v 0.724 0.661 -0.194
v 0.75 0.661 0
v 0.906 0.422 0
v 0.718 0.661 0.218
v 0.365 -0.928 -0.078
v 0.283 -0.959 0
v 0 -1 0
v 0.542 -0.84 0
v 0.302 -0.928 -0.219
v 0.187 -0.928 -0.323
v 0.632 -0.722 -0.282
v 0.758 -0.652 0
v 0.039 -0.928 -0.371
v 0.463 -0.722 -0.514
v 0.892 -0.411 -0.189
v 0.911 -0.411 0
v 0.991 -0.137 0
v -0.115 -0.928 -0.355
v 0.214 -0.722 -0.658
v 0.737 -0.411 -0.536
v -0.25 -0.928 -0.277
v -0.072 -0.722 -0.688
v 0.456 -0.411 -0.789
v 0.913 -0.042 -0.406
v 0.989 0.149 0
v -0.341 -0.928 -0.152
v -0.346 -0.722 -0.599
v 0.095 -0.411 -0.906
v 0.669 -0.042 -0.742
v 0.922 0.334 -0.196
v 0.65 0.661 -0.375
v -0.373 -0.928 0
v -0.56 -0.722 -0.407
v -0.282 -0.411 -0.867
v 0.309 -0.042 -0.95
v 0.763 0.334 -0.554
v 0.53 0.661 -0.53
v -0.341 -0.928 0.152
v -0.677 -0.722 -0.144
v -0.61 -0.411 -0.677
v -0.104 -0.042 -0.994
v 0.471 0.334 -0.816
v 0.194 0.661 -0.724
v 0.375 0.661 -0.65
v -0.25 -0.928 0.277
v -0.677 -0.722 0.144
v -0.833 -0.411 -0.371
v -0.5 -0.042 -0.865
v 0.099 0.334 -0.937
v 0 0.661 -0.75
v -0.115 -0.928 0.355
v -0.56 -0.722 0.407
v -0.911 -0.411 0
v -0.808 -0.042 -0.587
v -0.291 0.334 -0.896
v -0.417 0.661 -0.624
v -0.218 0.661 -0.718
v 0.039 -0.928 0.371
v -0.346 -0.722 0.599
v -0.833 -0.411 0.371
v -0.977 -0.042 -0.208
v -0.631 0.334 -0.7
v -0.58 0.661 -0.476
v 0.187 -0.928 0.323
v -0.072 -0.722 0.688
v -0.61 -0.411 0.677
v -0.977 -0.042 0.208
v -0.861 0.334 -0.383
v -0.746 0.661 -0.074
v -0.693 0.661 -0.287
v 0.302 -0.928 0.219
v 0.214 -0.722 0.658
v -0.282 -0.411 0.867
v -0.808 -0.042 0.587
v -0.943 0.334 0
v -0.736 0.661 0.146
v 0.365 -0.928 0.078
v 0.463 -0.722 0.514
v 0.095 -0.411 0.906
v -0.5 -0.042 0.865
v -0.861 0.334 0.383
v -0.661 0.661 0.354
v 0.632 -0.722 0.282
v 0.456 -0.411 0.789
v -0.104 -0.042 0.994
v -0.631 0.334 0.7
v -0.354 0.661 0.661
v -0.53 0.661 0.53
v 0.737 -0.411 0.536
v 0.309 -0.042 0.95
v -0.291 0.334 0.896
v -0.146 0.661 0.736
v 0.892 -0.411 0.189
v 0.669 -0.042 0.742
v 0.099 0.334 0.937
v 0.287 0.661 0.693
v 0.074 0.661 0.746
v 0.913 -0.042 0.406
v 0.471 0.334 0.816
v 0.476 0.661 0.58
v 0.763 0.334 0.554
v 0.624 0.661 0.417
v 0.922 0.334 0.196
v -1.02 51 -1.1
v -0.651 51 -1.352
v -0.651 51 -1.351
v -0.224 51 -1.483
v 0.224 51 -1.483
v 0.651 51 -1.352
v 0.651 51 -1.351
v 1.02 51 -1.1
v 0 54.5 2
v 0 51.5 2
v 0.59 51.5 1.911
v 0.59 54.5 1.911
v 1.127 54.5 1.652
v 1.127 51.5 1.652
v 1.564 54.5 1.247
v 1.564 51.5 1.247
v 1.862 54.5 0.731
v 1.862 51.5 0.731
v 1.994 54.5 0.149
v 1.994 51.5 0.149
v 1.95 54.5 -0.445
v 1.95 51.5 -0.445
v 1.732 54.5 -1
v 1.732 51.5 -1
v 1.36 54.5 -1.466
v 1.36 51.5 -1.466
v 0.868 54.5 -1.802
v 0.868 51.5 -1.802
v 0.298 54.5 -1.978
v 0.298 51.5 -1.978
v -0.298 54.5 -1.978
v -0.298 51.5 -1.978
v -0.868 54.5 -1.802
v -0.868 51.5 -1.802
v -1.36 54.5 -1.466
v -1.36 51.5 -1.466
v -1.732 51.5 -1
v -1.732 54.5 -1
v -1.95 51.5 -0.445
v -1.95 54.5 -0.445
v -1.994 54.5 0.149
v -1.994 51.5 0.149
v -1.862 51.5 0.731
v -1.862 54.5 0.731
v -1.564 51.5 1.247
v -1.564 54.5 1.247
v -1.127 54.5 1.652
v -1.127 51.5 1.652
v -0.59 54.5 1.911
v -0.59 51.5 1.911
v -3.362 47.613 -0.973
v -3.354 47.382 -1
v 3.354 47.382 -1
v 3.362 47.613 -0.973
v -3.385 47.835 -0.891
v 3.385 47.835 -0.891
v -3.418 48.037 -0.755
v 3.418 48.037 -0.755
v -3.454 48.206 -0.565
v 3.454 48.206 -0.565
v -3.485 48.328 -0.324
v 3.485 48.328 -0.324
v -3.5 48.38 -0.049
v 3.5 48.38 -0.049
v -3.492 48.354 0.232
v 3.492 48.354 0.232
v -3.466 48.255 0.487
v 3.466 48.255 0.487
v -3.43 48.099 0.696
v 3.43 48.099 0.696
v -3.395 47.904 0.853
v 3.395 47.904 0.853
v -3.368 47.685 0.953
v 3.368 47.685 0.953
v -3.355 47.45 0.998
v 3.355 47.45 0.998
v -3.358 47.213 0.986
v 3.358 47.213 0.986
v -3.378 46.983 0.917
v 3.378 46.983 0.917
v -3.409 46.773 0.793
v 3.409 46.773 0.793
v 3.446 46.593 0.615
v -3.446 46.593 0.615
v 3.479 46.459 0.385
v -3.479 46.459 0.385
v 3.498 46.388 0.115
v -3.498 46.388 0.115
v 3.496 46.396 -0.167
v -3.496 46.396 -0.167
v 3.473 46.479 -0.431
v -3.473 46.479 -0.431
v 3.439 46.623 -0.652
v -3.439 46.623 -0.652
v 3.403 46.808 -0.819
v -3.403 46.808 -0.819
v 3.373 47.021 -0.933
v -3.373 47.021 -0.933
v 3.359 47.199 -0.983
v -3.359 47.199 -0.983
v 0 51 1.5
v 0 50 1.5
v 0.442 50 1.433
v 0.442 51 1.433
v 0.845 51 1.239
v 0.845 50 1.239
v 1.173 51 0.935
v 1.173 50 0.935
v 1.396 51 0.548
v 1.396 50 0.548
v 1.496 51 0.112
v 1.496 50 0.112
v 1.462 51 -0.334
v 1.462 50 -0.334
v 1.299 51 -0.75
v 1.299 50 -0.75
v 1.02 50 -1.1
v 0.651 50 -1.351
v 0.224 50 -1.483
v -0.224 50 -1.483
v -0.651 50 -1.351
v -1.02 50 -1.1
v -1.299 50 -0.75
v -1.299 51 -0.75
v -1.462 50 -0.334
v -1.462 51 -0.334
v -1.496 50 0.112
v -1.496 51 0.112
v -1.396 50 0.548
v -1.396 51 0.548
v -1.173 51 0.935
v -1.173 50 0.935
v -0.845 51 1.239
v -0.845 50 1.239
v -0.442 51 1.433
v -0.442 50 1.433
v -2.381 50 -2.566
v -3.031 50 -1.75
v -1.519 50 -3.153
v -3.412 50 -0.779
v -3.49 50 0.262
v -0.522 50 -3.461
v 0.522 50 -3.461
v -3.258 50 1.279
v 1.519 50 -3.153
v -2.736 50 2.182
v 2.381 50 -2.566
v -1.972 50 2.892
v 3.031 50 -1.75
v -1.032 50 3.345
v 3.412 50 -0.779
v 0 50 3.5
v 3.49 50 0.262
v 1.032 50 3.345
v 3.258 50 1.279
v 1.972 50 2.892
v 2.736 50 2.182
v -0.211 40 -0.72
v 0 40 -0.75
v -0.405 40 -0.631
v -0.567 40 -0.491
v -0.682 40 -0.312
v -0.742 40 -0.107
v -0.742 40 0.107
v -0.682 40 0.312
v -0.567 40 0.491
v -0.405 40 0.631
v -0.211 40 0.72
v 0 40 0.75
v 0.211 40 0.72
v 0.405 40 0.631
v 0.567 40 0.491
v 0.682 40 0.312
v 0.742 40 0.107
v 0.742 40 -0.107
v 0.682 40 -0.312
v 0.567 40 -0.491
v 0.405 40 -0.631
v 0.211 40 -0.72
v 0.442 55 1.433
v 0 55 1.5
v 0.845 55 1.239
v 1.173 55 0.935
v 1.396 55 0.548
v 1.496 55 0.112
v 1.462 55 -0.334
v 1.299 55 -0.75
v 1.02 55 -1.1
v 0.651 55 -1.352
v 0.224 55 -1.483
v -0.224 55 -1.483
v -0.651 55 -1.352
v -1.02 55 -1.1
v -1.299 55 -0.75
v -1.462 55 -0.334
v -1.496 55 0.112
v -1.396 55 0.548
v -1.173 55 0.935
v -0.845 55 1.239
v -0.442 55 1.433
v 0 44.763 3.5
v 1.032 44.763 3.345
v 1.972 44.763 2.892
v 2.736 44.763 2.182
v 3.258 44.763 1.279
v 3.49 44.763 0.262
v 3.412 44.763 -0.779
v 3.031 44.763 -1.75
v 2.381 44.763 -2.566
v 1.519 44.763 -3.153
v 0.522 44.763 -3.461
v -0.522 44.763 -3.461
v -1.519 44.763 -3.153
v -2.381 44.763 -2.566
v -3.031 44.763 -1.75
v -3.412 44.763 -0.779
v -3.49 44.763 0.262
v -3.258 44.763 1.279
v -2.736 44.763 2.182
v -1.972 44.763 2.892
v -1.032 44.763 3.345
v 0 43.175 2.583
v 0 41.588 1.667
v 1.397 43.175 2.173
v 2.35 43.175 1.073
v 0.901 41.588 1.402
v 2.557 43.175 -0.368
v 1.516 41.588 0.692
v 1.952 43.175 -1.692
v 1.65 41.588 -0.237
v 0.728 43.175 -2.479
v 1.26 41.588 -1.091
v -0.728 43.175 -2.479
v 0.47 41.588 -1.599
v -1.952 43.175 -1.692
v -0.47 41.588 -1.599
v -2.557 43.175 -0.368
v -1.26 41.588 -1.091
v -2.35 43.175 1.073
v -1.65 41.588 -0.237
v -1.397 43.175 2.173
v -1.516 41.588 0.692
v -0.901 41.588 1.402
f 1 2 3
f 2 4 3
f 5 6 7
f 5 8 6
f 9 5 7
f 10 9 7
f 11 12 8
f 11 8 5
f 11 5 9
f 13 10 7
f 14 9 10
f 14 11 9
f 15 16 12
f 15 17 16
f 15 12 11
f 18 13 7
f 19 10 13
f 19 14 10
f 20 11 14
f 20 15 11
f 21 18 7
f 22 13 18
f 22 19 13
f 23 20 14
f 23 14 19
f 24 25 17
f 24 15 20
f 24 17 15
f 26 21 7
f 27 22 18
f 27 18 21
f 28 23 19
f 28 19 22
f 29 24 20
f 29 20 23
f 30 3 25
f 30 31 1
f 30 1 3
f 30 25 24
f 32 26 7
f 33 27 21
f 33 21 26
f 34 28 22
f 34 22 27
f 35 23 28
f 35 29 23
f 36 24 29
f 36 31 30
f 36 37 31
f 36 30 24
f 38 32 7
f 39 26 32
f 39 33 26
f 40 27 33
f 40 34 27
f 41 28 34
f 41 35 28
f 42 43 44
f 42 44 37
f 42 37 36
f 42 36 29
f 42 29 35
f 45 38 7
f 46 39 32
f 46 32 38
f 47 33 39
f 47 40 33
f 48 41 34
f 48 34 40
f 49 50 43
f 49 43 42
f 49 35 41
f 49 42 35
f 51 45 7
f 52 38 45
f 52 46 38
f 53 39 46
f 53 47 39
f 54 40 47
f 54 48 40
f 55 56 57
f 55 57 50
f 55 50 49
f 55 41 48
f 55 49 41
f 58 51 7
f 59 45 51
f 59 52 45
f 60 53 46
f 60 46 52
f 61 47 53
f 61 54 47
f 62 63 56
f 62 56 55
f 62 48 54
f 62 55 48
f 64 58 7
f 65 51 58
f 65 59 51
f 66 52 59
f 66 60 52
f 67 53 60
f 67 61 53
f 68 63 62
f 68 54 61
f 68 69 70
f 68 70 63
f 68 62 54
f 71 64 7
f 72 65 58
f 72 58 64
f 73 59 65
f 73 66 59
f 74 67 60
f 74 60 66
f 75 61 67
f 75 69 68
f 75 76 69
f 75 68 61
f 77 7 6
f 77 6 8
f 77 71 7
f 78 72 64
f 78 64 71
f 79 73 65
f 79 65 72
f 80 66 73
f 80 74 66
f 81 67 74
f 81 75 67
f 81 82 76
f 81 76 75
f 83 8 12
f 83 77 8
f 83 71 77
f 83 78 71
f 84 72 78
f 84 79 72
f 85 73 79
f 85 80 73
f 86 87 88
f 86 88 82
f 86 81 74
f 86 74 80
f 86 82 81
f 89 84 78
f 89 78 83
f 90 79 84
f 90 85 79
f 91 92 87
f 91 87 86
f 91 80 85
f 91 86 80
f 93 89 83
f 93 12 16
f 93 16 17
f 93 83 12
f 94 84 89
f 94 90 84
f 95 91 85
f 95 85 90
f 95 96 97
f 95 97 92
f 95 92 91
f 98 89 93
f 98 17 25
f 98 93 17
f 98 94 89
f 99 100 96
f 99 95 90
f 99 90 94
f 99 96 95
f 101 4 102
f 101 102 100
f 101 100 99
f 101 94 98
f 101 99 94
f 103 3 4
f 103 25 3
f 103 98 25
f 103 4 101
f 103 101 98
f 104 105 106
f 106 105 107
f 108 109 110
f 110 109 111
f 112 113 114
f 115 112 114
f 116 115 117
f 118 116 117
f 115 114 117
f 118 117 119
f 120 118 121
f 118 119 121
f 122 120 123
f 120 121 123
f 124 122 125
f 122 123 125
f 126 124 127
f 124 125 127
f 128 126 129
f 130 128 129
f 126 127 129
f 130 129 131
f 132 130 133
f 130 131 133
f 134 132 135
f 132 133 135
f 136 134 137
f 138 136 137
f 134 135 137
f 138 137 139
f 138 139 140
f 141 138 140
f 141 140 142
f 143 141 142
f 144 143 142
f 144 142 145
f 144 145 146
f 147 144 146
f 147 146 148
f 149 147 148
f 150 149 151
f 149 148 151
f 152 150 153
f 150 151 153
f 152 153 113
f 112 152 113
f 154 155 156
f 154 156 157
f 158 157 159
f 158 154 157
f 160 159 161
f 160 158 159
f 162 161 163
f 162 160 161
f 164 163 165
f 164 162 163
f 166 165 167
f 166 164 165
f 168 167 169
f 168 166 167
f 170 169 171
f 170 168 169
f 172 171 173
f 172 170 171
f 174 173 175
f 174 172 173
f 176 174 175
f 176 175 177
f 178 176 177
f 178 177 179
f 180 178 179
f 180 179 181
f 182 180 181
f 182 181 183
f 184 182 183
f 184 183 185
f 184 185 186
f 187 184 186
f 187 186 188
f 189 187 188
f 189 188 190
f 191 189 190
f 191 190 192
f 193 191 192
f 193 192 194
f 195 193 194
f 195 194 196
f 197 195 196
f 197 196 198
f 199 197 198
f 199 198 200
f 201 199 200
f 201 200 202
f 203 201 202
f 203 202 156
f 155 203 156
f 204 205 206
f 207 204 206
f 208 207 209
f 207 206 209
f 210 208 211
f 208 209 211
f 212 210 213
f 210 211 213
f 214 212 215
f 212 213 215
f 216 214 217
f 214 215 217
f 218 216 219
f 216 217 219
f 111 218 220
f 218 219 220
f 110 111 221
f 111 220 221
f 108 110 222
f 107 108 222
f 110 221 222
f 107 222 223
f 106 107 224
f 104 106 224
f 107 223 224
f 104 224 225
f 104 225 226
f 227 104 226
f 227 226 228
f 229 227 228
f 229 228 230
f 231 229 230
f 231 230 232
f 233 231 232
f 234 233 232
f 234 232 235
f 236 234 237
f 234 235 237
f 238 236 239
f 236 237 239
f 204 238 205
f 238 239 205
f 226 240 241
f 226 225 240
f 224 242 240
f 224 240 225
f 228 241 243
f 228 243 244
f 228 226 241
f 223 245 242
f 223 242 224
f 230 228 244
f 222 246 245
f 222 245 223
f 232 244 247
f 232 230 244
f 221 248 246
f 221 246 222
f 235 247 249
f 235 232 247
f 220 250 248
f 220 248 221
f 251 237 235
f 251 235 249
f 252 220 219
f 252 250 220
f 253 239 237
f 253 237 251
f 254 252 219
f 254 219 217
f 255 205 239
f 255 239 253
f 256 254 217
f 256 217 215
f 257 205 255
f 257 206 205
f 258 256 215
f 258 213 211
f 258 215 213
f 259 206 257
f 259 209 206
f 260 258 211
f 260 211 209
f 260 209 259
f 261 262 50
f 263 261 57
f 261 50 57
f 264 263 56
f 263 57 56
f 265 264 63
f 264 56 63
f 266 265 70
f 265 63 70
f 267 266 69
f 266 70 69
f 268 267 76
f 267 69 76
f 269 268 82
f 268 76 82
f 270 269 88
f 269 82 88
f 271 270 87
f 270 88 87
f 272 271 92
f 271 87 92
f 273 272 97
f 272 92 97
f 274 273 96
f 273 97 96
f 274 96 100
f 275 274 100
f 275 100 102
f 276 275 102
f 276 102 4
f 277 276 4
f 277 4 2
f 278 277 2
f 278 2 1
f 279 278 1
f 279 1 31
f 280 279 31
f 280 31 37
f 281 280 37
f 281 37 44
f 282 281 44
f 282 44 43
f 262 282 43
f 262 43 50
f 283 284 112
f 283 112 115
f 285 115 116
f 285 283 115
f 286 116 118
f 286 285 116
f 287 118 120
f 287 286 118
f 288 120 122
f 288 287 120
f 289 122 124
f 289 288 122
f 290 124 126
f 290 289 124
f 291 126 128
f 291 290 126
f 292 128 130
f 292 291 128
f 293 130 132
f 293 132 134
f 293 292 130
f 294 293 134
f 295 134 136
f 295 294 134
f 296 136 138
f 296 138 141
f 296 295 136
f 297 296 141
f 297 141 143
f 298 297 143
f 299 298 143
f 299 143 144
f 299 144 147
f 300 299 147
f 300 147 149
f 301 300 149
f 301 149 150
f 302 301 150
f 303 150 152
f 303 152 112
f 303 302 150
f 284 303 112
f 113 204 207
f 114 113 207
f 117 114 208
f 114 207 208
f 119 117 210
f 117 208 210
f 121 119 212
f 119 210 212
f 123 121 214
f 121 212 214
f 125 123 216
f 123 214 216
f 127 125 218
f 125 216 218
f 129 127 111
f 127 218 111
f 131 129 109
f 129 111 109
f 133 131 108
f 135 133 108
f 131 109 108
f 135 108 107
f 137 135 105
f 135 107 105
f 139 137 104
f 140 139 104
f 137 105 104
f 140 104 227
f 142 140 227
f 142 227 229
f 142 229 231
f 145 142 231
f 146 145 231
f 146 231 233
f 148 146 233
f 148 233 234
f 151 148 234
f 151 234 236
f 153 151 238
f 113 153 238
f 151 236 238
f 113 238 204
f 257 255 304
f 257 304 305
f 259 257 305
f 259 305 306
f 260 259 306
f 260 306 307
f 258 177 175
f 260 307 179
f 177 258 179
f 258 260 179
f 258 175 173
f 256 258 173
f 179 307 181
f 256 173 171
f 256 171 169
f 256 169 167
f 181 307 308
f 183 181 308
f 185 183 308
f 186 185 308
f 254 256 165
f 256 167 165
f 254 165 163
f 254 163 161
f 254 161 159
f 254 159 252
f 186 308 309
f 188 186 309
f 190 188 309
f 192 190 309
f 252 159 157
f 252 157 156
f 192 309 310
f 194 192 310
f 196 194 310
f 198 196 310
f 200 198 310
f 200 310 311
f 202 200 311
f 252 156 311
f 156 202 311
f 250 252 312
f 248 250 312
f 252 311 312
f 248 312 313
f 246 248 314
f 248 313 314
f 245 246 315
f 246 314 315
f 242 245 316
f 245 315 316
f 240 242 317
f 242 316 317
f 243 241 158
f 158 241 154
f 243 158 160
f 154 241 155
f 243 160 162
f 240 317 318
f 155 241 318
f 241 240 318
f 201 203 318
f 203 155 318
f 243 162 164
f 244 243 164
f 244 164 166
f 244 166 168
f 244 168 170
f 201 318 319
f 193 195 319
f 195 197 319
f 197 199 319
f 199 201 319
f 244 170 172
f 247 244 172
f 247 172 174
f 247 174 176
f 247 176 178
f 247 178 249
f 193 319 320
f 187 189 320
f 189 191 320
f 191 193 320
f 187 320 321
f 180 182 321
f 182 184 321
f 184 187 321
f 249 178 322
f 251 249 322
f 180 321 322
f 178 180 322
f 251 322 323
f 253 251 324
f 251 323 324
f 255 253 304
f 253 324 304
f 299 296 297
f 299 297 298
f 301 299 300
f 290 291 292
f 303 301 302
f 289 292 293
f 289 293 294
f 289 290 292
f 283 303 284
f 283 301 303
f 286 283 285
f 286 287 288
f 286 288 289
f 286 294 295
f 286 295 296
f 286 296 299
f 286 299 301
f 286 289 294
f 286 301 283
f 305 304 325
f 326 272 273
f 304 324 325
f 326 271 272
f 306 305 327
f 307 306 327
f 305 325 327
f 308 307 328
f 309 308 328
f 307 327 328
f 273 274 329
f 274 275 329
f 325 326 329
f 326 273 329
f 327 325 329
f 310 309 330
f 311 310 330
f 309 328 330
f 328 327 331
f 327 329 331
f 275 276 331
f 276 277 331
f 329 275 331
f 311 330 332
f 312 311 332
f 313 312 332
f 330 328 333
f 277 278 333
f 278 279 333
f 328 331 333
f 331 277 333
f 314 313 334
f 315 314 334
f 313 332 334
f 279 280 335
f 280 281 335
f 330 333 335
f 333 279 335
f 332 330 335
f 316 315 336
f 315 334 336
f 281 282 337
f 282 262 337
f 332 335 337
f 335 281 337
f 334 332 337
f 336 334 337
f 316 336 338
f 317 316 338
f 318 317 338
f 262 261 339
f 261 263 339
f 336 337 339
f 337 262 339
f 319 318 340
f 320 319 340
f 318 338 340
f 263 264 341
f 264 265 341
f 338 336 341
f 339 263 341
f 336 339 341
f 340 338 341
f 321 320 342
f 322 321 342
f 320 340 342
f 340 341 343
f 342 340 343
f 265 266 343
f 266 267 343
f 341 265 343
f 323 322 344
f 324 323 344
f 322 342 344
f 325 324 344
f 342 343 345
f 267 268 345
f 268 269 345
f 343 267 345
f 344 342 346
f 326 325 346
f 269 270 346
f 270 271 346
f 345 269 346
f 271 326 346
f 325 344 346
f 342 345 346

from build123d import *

# Parameters (mm, degrees)
SKETCH2_R               = 0.75
BOSS_EXTRUDE2_DEPTH     = 40
SKETCH4_R               = 3.5
BOSS_EXTRUDE3_DEPTH     = 10
CHAMFER1_SIZE           = 4.763139721
CHAMFER1_SIZE_2         = 2.75
CUT_EXTRUDE4_DEPTH      = 51.244402673
CUT_EXTRUDE4_DEPTH_BACK = 51.244402673
SKETCH5_R               = 1
SKETCH6_R               = 1.5
BOSS_EXTRUDE4_DEPTH     = 1
SKETCH7_R               = 2
BOSS_EXTRUDE5_DEPTH     = 4
CHAMFER2_SIZE           = 0.5


# Some blends are built 0.0001 mm under size
with BuildPart() as part:
    # Sketch1 → Revolve1 (revolve)
    with BuildSketch(Plane.XY):
        with BuildLine():
            Line((0, 0), (0, -1))
            ThreePointArc((0, -1), (1, 0), (0, 1))
            Line((0, 1), (0, 0))
        make_face()
    revolve(axis=Axis((0, 0, 0), (0, 1, 0)))

    # Sketch2 → Boss-Extrude2 (add)
    with BuildSketch(Plane(origin=(0, 0, 0), x_dir=(1, 0, 0), z_dir=(0, 1, 0))):
        with Locations(Location((0, 0, 0), (0, 0, 90))):
            Circle(SKETCH2_R)
    extrude(amount=BOSS_EXTRUDE2_DEPTH)

    # Sketch4 → Boss-Extrude3 (add)
    with BuildSketch(Plane(origin=(0, 40, 0), x_dir=(1, 0, 0), z_dir=(0, 1, 0))):
        with Locations(Location((0, 0, 0), (0, 0, 270))):
            Circle(SKETCH4_R)
    extrude(amount=BOSS_EXTRUDE3_DEPTH)

    # Chamfer1
    # the kernel refuses this chamfer: 4.763139721, 2.75 mm, written as the material it takes off along each edge
    with BuildSketch(Plane(origin=(0, 40, 0), x_dir=(0, 0, 1), z_dir=(-1, 0, 0))) as chamfer1_piece_1_section:
        Polygon((3.5, CHAMFER1_SIZE), (3.5 - CHAMFER1_SIZE_2, 0), (3.5, 0), align=None)
    chamfer1_piece_1 = revolve(axis=Axis((0, 40, 0), (0, 1, 0)), mode=Mode.PRIVATE)
    chamfer1_piece_1 = chamfer1_piece_1 - Plane(origin=(0, 42.439255441, 0), x_dir=(0, 0, -1), z_dir=(0, -1, 0)) * Cylinder(0.75, 20, mode=Mode.PRIVATE)
    add(chamfer1_piece_1, mode=Mode.SUBTRACT)

    # Sketch5 → Cut-Extrude4 (cut, two sides: drawn at the far end of the back side and taken through both)
    with BuildSketch(Plane(origin=(0, 0, 0), x_dir=(0, 0, -1), z_dir=(1, 0, 0)).offset(-CUT_EXTRUDE4_DEPTH_BACK)):
        with Locations((0, 47.38156986)):
            Circle(SKETCH5_R)
    extrude(amount=CUT_EXTRUDE4_DEPTH + CUT_EXTRUDE4_DEPTH_BACK, mode=Mode.SUBTRACT)

    # Sketch6 → Boss-Extrude4 (add)
    with BuildSketch(Plane(origin=(0, 50, 0), x_dir=(1, 0, 0), z_dir=(0, 1, 0))):
        with Locations(Location((0, 0, 0), (0, 0, 270))):
            Circle(SKETCH6_R)
    extrude(amount=BOSS_EXTRUDE4_DEPTH)

    # Sketch7 → Boss-Extrude5 (add)
    with BuildSketch(Plane(origin=(0, 51, 0), x_dir=(1, 0, 0), z_dir=(0, 1, 0))):
        with Locations(Location((0, 0, 0), (0, 0, 270))):
            Circle(SKETCH7_R)
    extrude(amount=BOSS_EXTRUDE5_DEPTH)

    # Chamfer2
    chamfer2_edges = [part.edges().sort_by_distance(p)[0] for p in [
        (0, 51, -2),
        (0, 55, -2),
    ]]
    chamfer(chamfer2_edges, length=CHAMFER2_SIZE - 0.0001)  # a hair under: the kernel refuses the full size


solid = part.part
